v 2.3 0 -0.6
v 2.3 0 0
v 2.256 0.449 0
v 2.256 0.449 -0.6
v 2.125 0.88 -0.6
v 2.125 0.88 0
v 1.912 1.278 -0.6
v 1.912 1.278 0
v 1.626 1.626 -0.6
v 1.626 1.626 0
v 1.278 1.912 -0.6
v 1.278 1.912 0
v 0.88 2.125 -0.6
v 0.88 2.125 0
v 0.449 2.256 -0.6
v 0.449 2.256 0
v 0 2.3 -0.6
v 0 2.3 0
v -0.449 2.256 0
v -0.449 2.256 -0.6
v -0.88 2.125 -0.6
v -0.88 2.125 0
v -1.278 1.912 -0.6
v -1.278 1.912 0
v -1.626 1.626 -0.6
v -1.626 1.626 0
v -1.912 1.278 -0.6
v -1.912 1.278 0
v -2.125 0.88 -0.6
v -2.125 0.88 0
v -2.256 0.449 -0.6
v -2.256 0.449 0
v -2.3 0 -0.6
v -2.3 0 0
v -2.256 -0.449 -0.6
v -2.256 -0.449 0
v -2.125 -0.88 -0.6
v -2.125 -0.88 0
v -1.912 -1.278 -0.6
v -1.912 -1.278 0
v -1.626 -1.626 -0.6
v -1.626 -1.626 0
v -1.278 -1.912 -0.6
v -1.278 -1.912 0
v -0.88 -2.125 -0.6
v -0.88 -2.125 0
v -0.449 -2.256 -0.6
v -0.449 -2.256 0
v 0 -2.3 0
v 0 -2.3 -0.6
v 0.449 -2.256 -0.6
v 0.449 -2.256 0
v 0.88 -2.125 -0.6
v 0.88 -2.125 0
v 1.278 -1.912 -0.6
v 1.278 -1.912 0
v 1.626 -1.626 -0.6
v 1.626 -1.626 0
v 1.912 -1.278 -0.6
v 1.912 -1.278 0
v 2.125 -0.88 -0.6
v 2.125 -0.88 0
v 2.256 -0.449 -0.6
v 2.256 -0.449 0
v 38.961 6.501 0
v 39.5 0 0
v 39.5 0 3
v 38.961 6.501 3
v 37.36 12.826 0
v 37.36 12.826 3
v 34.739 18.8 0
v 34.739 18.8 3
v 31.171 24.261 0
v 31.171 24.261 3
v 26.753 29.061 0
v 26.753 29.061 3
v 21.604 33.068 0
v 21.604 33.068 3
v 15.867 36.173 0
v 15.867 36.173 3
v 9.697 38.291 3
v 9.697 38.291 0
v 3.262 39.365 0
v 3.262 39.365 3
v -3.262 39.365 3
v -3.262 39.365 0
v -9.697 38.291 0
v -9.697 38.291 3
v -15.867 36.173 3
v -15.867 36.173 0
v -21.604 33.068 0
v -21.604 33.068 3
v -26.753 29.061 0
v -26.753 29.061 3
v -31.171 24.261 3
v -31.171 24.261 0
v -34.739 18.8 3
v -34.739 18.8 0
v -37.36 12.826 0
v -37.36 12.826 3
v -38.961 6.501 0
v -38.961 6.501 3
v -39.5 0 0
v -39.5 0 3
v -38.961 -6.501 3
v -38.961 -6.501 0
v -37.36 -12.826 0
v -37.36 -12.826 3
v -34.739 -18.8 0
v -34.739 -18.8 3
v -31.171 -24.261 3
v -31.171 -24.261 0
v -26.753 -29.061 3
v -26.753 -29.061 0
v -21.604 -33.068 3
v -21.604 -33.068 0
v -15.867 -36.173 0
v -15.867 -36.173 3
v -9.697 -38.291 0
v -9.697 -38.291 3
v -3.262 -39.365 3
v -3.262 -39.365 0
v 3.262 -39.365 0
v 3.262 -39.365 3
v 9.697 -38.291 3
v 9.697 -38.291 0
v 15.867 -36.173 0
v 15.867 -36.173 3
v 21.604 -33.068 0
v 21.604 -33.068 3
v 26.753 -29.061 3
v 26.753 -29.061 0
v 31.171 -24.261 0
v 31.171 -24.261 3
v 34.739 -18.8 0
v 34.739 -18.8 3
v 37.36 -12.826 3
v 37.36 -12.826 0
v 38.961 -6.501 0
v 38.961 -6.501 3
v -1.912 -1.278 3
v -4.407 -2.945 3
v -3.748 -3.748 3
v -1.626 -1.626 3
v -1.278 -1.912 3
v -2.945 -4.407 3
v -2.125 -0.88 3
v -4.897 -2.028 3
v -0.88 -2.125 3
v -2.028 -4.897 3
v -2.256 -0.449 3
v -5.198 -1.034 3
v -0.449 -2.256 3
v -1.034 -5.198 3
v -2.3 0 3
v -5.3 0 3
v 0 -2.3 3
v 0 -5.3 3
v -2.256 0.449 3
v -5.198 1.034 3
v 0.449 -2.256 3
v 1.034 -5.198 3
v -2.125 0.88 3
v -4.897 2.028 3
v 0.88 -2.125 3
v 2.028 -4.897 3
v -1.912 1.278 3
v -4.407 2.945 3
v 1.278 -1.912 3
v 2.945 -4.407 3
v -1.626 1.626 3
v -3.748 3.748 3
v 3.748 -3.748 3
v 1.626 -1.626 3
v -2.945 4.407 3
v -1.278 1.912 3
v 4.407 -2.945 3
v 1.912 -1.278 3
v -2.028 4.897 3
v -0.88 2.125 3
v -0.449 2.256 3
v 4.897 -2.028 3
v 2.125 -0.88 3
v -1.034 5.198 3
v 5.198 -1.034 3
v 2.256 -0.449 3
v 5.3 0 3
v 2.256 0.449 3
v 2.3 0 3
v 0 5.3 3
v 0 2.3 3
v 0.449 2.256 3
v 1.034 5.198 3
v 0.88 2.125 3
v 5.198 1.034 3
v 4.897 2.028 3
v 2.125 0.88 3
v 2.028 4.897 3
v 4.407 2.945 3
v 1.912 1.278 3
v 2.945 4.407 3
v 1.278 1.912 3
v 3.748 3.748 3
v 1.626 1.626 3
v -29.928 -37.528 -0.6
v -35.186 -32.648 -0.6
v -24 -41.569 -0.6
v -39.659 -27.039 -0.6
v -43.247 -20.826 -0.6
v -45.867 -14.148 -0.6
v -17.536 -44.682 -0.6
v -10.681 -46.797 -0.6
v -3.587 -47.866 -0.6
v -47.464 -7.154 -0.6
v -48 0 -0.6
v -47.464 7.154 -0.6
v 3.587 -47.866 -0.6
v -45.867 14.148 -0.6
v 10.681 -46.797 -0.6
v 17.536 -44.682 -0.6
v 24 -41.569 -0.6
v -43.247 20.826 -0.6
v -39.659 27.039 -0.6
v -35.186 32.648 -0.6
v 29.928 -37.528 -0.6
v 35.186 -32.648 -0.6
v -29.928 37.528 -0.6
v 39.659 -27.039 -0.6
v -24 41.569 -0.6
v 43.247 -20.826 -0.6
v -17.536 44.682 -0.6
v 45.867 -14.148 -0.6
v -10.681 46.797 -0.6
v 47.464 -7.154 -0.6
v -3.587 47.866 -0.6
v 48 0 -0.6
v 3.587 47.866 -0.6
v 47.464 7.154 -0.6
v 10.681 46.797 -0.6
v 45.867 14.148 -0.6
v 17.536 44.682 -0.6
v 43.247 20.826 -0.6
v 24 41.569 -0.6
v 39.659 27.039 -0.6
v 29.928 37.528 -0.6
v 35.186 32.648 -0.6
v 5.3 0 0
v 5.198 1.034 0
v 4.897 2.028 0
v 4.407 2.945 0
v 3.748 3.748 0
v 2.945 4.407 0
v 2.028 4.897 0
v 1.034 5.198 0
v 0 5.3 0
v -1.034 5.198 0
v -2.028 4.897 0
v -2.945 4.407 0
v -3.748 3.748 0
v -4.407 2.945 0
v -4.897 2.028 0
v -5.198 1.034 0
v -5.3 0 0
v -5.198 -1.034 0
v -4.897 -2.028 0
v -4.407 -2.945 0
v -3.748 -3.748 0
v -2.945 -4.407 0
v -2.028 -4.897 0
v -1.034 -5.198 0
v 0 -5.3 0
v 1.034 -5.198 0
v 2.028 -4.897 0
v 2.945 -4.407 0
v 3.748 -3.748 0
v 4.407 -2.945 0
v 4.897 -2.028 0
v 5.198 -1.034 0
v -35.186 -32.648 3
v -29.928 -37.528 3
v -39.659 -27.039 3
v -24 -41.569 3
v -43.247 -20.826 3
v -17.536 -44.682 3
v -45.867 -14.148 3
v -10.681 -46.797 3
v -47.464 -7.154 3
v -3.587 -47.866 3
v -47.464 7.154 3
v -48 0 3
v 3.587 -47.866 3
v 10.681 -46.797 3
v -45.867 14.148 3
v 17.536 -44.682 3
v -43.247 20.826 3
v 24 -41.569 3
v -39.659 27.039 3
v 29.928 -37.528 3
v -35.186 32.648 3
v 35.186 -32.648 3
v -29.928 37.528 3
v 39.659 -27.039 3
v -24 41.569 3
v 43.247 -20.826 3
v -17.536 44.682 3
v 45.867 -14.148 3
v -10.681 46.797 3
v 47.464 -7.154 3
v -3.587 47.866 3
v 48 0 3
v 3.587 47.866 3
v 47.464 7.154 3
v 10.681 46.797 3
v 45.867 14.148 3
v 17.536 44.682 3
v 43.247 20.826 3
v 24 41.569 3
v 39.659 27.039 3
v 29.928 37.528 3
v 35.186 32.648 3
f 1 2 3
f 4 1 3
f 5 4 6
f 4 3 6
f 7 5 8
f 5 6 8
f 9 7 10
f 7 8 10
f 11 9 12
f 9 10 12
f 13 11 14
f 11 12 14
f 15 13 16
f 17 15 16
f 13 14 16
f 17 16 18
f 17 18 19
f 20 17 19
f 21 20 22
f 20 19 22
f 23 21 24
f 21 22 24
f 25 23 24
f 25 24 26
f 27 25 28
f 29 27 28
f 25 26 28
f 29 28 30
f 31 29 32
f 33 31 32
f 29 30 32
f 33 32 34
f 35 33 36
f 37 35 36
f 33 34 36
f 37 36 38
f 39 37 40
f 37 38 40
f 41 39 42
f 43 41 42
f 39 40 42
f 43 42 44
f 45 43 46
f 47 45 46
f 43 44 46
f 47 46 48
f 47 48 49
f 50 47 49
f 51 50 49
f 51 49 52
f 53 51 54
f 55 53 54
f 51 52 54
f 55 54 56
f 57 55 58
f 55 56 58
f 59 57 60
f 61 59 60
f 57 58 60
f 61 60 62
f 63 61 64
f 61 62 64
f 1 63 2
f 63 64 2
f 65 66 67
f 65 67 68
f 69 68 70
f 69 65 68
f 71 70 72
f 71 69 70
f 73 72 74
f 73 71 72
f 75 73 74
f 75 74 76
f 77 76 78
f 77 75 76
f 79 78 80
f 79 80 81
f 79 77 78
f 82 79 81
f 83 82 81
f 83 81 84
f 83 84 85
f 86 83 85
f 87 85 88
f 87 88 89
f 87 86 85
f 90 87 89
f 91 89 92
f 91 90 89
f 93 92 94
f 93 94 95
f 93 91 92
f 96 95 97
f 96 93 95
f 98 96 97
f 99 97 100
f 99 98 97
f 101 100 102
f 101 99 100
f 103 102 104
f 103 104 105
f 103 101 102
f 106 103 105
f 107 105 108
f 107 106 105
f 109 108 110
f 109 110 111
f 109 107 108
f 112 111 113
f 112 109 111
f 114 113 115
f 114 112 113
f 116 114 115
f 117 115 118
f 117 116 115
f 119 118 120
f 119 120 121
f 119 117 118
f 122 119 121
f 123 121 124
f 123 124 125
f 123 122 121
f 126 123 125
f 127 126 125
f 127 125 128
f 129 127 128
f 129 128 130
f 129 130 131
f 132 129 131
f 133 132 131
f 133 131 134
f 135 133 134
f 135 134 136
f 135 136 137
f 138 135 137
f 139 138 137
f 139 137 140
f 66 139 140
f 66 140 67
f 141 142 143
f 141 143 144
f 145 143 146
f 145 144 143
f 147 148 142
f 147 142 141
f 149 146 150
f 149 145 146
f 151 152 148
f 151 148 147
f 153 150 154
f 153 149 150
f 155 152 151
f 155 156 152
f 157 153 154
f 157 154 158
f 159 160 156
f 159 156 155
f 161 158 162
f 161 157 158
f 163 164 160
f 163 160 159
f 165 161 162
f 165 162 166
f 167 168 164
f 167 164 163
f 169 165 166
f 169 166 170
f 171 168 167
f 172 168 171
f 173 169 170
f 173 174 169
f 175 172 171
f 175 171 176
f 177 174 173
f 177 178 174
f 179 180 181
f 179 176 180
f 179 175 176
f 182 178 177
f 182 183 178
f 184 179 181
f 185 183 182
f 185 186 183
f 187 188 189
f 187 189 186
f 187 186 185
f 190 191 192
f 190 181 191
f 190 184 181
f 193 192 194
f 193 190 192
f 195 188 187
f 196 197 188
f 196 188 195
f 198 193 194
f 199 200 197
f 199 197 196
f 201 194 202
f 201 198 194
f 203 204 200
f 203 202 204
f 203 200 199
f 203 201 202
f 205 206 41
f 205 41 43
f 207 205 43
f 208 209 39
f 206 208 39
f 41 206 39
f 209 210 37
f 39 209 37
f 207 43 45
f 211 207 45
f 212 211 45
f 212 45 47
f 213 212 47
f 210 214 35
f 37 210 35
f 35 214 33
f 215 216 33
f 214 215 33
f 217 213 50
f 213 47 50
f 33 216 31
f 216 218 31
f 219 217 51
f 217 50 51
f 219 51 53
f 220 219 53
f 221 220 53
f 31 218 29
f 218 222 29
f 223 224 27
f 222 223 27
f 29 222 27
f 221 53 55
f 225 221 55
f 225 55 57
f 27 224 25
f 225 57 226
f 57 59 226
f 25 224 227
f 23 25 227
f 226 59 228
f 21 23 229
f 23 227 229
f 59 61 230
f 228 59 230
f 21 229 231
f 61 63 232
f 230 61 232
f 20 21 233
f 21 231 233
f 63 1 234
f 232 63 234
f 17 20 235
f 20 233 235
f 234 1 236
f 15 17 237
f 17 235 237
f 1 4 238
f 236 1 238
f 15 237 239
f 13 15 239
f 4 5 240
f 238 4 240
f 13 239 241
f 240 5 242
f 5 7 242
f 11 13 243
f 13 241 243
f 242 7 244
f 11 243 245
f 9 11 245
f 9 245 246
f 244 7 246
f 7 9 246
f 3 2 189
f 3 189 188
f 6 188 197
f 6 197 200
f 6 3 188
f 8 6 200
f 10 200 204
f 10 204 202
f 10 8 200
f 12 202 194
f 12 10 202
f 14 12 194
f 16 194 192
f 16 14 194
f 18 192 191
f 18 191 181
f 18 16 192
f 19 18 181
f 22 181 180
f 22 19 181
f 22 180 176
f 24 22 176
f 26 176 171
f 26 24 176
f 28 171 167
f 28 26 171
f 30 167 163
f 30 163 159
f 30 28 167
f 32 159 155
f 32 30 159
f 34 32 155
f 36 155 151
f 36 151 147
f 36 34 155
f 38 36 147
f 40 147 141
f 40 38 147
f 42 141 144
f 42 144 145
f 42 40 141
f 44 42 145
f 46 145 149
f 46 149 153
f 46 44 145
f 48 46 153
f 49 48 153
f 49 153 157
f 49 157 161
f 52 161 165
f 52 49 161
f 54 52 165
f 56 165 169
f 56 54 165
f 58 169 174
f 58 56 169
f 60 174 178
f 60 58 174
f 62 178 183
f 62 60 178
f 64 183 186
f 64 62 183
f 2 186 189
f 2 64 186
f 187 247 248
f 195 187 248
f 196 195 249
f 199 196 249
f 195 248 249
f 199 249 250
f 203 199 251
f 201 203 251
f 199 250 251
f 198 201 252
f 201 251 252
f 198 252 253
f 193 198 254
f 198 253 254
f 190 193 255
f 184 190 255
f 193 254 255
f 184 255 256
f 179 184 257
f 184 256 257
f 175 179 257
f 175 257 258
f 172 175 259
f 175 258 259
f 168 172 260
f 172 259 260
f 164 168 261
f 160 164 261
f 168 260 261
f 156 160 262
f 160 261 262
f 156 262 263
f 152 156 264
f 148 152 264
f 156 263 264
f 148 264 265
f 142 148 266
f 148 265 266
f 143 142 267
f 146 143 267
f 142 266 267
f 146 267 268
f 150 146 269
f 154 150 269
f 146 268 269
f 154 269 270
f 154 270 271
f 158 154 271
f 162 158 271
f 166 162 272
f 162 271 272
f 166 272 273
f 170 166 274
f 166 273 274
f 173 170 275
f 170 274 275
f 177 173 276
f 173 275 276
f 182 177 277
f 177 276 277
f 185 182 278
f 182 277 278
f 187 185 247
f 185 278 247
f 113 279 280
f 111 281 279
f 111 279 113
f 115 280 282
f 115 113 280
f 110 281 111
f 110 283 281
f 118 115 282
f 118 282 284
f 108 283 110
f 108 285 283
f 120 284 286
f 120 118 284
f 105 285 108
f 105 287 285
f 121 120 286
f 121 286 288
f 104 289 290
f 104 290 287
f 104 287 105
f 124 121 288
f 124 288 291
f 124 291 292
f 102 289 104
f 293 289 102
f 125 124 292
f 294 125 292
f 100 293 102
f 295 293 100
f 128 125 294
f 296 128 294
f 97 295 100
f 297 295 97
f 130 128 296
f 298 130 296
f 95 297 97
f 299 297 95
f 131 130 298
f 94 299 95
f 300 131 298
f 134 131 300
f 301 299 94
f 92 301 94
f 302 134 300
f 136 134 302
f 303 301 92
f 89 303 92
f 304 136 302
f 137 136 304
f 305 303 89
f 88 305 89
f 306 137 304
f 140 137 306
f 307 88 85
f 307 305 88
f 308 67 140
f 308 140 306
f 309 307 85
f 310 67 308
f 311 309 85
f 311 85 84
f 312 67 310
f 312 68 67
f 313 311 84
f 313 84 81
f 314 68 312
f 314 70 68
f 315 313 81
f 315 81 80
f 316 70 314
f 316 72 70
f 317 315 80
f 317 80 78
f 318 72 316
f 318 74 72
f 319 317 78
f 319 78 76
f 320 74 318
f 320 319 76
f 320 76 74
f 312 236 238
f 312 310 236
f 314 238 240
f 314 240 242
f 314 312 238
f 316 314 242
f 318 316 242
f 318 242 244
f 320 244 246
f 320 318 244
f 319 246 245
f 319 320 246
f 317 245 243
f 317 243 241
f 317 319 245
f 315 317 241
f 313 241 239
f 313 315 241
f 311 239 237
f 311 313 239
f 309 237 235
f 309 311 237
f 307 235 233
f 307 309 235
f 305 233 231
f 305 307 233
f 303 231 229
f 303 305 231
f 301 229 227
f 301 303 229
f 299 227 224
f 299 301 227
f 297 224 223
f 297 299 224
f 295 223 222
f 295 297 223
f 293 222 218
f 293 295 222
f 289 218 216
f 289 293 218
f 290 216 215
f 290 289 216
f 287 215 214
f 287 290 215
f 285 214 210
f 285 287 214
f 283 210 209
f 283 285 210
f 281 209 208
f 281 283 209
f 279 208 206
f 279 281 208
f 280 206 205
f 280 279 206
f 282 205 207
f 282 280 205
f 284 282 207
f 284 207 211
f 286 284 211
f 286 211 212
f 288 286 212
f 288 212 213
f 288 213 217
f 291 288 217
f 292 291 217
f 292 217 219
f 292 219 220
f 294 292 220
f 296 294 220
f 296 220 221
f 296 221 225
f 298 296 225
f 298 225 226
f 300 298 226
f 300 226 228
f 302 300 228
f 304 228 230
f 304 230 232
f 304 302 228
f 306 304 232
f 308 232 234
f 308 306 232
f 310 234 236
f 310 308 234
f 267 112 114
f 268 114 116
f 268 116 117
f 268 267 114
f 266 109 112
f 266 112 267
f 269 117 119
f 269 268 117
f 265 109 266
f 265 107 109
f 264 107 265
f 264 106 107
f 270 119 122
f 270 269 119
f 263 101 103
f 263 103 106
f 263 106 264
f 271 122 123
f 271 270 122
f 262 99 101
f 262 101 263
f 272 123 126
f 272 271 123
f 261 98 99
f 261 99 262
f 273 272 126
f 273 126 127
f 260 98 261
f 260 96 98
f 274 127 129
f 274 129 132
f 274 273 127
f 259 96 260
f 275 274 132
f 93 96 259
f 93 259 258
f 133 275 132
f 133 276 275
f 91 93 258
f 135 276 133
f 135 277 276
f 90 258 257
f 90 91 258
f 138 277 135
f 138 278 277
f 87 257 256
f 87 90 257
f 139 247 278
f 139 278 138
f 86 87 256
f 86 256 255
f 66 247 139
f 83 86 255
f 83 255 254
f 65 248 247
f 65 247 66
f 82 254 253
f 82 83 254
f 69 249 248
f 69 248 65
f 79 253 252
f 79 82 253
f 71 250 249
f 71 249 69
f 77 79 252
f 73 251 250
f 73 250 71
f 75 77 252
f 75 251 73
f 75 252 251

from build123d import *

# Parameters (mm, degrees)
F0_R     = 48
F0_R_2   = 39.5
F0_R_3   = 5.3
F0_R_4   = 2.3
F1_DEPTH = 3
F2_DEPTH = 0.6


with BuildPart() as f1:
    # F0 (on Top) → F1 (new body)
    with BuildSketch(Plane.XY):
        Circle(F0_R)
        Circle(F0_R_2, mode=Mode.SUBTRACT)
        Circle(F0_R_3)
        Circle(F0_R_4, mode=Mode.SUBTRACT)
    extrude(amount=F1_DEPTH)

    # F0 (on Top) → F2 (join)
    with BuildSketch(Plane.XY):
        Circle(F0_R)
        Circle(F0_R_2, mode=Mode.SUBTRACT)
        Circle(F0_R_2)
        Circle(F0_R_3, mode=Mode.SUBTRACT)
        Circle(F0_R_3)
        Circle(F0_R_4, mode=Mode.SUBTRACT)
    extrude(amount=-F2_DEPTH)


solid = f1.part
